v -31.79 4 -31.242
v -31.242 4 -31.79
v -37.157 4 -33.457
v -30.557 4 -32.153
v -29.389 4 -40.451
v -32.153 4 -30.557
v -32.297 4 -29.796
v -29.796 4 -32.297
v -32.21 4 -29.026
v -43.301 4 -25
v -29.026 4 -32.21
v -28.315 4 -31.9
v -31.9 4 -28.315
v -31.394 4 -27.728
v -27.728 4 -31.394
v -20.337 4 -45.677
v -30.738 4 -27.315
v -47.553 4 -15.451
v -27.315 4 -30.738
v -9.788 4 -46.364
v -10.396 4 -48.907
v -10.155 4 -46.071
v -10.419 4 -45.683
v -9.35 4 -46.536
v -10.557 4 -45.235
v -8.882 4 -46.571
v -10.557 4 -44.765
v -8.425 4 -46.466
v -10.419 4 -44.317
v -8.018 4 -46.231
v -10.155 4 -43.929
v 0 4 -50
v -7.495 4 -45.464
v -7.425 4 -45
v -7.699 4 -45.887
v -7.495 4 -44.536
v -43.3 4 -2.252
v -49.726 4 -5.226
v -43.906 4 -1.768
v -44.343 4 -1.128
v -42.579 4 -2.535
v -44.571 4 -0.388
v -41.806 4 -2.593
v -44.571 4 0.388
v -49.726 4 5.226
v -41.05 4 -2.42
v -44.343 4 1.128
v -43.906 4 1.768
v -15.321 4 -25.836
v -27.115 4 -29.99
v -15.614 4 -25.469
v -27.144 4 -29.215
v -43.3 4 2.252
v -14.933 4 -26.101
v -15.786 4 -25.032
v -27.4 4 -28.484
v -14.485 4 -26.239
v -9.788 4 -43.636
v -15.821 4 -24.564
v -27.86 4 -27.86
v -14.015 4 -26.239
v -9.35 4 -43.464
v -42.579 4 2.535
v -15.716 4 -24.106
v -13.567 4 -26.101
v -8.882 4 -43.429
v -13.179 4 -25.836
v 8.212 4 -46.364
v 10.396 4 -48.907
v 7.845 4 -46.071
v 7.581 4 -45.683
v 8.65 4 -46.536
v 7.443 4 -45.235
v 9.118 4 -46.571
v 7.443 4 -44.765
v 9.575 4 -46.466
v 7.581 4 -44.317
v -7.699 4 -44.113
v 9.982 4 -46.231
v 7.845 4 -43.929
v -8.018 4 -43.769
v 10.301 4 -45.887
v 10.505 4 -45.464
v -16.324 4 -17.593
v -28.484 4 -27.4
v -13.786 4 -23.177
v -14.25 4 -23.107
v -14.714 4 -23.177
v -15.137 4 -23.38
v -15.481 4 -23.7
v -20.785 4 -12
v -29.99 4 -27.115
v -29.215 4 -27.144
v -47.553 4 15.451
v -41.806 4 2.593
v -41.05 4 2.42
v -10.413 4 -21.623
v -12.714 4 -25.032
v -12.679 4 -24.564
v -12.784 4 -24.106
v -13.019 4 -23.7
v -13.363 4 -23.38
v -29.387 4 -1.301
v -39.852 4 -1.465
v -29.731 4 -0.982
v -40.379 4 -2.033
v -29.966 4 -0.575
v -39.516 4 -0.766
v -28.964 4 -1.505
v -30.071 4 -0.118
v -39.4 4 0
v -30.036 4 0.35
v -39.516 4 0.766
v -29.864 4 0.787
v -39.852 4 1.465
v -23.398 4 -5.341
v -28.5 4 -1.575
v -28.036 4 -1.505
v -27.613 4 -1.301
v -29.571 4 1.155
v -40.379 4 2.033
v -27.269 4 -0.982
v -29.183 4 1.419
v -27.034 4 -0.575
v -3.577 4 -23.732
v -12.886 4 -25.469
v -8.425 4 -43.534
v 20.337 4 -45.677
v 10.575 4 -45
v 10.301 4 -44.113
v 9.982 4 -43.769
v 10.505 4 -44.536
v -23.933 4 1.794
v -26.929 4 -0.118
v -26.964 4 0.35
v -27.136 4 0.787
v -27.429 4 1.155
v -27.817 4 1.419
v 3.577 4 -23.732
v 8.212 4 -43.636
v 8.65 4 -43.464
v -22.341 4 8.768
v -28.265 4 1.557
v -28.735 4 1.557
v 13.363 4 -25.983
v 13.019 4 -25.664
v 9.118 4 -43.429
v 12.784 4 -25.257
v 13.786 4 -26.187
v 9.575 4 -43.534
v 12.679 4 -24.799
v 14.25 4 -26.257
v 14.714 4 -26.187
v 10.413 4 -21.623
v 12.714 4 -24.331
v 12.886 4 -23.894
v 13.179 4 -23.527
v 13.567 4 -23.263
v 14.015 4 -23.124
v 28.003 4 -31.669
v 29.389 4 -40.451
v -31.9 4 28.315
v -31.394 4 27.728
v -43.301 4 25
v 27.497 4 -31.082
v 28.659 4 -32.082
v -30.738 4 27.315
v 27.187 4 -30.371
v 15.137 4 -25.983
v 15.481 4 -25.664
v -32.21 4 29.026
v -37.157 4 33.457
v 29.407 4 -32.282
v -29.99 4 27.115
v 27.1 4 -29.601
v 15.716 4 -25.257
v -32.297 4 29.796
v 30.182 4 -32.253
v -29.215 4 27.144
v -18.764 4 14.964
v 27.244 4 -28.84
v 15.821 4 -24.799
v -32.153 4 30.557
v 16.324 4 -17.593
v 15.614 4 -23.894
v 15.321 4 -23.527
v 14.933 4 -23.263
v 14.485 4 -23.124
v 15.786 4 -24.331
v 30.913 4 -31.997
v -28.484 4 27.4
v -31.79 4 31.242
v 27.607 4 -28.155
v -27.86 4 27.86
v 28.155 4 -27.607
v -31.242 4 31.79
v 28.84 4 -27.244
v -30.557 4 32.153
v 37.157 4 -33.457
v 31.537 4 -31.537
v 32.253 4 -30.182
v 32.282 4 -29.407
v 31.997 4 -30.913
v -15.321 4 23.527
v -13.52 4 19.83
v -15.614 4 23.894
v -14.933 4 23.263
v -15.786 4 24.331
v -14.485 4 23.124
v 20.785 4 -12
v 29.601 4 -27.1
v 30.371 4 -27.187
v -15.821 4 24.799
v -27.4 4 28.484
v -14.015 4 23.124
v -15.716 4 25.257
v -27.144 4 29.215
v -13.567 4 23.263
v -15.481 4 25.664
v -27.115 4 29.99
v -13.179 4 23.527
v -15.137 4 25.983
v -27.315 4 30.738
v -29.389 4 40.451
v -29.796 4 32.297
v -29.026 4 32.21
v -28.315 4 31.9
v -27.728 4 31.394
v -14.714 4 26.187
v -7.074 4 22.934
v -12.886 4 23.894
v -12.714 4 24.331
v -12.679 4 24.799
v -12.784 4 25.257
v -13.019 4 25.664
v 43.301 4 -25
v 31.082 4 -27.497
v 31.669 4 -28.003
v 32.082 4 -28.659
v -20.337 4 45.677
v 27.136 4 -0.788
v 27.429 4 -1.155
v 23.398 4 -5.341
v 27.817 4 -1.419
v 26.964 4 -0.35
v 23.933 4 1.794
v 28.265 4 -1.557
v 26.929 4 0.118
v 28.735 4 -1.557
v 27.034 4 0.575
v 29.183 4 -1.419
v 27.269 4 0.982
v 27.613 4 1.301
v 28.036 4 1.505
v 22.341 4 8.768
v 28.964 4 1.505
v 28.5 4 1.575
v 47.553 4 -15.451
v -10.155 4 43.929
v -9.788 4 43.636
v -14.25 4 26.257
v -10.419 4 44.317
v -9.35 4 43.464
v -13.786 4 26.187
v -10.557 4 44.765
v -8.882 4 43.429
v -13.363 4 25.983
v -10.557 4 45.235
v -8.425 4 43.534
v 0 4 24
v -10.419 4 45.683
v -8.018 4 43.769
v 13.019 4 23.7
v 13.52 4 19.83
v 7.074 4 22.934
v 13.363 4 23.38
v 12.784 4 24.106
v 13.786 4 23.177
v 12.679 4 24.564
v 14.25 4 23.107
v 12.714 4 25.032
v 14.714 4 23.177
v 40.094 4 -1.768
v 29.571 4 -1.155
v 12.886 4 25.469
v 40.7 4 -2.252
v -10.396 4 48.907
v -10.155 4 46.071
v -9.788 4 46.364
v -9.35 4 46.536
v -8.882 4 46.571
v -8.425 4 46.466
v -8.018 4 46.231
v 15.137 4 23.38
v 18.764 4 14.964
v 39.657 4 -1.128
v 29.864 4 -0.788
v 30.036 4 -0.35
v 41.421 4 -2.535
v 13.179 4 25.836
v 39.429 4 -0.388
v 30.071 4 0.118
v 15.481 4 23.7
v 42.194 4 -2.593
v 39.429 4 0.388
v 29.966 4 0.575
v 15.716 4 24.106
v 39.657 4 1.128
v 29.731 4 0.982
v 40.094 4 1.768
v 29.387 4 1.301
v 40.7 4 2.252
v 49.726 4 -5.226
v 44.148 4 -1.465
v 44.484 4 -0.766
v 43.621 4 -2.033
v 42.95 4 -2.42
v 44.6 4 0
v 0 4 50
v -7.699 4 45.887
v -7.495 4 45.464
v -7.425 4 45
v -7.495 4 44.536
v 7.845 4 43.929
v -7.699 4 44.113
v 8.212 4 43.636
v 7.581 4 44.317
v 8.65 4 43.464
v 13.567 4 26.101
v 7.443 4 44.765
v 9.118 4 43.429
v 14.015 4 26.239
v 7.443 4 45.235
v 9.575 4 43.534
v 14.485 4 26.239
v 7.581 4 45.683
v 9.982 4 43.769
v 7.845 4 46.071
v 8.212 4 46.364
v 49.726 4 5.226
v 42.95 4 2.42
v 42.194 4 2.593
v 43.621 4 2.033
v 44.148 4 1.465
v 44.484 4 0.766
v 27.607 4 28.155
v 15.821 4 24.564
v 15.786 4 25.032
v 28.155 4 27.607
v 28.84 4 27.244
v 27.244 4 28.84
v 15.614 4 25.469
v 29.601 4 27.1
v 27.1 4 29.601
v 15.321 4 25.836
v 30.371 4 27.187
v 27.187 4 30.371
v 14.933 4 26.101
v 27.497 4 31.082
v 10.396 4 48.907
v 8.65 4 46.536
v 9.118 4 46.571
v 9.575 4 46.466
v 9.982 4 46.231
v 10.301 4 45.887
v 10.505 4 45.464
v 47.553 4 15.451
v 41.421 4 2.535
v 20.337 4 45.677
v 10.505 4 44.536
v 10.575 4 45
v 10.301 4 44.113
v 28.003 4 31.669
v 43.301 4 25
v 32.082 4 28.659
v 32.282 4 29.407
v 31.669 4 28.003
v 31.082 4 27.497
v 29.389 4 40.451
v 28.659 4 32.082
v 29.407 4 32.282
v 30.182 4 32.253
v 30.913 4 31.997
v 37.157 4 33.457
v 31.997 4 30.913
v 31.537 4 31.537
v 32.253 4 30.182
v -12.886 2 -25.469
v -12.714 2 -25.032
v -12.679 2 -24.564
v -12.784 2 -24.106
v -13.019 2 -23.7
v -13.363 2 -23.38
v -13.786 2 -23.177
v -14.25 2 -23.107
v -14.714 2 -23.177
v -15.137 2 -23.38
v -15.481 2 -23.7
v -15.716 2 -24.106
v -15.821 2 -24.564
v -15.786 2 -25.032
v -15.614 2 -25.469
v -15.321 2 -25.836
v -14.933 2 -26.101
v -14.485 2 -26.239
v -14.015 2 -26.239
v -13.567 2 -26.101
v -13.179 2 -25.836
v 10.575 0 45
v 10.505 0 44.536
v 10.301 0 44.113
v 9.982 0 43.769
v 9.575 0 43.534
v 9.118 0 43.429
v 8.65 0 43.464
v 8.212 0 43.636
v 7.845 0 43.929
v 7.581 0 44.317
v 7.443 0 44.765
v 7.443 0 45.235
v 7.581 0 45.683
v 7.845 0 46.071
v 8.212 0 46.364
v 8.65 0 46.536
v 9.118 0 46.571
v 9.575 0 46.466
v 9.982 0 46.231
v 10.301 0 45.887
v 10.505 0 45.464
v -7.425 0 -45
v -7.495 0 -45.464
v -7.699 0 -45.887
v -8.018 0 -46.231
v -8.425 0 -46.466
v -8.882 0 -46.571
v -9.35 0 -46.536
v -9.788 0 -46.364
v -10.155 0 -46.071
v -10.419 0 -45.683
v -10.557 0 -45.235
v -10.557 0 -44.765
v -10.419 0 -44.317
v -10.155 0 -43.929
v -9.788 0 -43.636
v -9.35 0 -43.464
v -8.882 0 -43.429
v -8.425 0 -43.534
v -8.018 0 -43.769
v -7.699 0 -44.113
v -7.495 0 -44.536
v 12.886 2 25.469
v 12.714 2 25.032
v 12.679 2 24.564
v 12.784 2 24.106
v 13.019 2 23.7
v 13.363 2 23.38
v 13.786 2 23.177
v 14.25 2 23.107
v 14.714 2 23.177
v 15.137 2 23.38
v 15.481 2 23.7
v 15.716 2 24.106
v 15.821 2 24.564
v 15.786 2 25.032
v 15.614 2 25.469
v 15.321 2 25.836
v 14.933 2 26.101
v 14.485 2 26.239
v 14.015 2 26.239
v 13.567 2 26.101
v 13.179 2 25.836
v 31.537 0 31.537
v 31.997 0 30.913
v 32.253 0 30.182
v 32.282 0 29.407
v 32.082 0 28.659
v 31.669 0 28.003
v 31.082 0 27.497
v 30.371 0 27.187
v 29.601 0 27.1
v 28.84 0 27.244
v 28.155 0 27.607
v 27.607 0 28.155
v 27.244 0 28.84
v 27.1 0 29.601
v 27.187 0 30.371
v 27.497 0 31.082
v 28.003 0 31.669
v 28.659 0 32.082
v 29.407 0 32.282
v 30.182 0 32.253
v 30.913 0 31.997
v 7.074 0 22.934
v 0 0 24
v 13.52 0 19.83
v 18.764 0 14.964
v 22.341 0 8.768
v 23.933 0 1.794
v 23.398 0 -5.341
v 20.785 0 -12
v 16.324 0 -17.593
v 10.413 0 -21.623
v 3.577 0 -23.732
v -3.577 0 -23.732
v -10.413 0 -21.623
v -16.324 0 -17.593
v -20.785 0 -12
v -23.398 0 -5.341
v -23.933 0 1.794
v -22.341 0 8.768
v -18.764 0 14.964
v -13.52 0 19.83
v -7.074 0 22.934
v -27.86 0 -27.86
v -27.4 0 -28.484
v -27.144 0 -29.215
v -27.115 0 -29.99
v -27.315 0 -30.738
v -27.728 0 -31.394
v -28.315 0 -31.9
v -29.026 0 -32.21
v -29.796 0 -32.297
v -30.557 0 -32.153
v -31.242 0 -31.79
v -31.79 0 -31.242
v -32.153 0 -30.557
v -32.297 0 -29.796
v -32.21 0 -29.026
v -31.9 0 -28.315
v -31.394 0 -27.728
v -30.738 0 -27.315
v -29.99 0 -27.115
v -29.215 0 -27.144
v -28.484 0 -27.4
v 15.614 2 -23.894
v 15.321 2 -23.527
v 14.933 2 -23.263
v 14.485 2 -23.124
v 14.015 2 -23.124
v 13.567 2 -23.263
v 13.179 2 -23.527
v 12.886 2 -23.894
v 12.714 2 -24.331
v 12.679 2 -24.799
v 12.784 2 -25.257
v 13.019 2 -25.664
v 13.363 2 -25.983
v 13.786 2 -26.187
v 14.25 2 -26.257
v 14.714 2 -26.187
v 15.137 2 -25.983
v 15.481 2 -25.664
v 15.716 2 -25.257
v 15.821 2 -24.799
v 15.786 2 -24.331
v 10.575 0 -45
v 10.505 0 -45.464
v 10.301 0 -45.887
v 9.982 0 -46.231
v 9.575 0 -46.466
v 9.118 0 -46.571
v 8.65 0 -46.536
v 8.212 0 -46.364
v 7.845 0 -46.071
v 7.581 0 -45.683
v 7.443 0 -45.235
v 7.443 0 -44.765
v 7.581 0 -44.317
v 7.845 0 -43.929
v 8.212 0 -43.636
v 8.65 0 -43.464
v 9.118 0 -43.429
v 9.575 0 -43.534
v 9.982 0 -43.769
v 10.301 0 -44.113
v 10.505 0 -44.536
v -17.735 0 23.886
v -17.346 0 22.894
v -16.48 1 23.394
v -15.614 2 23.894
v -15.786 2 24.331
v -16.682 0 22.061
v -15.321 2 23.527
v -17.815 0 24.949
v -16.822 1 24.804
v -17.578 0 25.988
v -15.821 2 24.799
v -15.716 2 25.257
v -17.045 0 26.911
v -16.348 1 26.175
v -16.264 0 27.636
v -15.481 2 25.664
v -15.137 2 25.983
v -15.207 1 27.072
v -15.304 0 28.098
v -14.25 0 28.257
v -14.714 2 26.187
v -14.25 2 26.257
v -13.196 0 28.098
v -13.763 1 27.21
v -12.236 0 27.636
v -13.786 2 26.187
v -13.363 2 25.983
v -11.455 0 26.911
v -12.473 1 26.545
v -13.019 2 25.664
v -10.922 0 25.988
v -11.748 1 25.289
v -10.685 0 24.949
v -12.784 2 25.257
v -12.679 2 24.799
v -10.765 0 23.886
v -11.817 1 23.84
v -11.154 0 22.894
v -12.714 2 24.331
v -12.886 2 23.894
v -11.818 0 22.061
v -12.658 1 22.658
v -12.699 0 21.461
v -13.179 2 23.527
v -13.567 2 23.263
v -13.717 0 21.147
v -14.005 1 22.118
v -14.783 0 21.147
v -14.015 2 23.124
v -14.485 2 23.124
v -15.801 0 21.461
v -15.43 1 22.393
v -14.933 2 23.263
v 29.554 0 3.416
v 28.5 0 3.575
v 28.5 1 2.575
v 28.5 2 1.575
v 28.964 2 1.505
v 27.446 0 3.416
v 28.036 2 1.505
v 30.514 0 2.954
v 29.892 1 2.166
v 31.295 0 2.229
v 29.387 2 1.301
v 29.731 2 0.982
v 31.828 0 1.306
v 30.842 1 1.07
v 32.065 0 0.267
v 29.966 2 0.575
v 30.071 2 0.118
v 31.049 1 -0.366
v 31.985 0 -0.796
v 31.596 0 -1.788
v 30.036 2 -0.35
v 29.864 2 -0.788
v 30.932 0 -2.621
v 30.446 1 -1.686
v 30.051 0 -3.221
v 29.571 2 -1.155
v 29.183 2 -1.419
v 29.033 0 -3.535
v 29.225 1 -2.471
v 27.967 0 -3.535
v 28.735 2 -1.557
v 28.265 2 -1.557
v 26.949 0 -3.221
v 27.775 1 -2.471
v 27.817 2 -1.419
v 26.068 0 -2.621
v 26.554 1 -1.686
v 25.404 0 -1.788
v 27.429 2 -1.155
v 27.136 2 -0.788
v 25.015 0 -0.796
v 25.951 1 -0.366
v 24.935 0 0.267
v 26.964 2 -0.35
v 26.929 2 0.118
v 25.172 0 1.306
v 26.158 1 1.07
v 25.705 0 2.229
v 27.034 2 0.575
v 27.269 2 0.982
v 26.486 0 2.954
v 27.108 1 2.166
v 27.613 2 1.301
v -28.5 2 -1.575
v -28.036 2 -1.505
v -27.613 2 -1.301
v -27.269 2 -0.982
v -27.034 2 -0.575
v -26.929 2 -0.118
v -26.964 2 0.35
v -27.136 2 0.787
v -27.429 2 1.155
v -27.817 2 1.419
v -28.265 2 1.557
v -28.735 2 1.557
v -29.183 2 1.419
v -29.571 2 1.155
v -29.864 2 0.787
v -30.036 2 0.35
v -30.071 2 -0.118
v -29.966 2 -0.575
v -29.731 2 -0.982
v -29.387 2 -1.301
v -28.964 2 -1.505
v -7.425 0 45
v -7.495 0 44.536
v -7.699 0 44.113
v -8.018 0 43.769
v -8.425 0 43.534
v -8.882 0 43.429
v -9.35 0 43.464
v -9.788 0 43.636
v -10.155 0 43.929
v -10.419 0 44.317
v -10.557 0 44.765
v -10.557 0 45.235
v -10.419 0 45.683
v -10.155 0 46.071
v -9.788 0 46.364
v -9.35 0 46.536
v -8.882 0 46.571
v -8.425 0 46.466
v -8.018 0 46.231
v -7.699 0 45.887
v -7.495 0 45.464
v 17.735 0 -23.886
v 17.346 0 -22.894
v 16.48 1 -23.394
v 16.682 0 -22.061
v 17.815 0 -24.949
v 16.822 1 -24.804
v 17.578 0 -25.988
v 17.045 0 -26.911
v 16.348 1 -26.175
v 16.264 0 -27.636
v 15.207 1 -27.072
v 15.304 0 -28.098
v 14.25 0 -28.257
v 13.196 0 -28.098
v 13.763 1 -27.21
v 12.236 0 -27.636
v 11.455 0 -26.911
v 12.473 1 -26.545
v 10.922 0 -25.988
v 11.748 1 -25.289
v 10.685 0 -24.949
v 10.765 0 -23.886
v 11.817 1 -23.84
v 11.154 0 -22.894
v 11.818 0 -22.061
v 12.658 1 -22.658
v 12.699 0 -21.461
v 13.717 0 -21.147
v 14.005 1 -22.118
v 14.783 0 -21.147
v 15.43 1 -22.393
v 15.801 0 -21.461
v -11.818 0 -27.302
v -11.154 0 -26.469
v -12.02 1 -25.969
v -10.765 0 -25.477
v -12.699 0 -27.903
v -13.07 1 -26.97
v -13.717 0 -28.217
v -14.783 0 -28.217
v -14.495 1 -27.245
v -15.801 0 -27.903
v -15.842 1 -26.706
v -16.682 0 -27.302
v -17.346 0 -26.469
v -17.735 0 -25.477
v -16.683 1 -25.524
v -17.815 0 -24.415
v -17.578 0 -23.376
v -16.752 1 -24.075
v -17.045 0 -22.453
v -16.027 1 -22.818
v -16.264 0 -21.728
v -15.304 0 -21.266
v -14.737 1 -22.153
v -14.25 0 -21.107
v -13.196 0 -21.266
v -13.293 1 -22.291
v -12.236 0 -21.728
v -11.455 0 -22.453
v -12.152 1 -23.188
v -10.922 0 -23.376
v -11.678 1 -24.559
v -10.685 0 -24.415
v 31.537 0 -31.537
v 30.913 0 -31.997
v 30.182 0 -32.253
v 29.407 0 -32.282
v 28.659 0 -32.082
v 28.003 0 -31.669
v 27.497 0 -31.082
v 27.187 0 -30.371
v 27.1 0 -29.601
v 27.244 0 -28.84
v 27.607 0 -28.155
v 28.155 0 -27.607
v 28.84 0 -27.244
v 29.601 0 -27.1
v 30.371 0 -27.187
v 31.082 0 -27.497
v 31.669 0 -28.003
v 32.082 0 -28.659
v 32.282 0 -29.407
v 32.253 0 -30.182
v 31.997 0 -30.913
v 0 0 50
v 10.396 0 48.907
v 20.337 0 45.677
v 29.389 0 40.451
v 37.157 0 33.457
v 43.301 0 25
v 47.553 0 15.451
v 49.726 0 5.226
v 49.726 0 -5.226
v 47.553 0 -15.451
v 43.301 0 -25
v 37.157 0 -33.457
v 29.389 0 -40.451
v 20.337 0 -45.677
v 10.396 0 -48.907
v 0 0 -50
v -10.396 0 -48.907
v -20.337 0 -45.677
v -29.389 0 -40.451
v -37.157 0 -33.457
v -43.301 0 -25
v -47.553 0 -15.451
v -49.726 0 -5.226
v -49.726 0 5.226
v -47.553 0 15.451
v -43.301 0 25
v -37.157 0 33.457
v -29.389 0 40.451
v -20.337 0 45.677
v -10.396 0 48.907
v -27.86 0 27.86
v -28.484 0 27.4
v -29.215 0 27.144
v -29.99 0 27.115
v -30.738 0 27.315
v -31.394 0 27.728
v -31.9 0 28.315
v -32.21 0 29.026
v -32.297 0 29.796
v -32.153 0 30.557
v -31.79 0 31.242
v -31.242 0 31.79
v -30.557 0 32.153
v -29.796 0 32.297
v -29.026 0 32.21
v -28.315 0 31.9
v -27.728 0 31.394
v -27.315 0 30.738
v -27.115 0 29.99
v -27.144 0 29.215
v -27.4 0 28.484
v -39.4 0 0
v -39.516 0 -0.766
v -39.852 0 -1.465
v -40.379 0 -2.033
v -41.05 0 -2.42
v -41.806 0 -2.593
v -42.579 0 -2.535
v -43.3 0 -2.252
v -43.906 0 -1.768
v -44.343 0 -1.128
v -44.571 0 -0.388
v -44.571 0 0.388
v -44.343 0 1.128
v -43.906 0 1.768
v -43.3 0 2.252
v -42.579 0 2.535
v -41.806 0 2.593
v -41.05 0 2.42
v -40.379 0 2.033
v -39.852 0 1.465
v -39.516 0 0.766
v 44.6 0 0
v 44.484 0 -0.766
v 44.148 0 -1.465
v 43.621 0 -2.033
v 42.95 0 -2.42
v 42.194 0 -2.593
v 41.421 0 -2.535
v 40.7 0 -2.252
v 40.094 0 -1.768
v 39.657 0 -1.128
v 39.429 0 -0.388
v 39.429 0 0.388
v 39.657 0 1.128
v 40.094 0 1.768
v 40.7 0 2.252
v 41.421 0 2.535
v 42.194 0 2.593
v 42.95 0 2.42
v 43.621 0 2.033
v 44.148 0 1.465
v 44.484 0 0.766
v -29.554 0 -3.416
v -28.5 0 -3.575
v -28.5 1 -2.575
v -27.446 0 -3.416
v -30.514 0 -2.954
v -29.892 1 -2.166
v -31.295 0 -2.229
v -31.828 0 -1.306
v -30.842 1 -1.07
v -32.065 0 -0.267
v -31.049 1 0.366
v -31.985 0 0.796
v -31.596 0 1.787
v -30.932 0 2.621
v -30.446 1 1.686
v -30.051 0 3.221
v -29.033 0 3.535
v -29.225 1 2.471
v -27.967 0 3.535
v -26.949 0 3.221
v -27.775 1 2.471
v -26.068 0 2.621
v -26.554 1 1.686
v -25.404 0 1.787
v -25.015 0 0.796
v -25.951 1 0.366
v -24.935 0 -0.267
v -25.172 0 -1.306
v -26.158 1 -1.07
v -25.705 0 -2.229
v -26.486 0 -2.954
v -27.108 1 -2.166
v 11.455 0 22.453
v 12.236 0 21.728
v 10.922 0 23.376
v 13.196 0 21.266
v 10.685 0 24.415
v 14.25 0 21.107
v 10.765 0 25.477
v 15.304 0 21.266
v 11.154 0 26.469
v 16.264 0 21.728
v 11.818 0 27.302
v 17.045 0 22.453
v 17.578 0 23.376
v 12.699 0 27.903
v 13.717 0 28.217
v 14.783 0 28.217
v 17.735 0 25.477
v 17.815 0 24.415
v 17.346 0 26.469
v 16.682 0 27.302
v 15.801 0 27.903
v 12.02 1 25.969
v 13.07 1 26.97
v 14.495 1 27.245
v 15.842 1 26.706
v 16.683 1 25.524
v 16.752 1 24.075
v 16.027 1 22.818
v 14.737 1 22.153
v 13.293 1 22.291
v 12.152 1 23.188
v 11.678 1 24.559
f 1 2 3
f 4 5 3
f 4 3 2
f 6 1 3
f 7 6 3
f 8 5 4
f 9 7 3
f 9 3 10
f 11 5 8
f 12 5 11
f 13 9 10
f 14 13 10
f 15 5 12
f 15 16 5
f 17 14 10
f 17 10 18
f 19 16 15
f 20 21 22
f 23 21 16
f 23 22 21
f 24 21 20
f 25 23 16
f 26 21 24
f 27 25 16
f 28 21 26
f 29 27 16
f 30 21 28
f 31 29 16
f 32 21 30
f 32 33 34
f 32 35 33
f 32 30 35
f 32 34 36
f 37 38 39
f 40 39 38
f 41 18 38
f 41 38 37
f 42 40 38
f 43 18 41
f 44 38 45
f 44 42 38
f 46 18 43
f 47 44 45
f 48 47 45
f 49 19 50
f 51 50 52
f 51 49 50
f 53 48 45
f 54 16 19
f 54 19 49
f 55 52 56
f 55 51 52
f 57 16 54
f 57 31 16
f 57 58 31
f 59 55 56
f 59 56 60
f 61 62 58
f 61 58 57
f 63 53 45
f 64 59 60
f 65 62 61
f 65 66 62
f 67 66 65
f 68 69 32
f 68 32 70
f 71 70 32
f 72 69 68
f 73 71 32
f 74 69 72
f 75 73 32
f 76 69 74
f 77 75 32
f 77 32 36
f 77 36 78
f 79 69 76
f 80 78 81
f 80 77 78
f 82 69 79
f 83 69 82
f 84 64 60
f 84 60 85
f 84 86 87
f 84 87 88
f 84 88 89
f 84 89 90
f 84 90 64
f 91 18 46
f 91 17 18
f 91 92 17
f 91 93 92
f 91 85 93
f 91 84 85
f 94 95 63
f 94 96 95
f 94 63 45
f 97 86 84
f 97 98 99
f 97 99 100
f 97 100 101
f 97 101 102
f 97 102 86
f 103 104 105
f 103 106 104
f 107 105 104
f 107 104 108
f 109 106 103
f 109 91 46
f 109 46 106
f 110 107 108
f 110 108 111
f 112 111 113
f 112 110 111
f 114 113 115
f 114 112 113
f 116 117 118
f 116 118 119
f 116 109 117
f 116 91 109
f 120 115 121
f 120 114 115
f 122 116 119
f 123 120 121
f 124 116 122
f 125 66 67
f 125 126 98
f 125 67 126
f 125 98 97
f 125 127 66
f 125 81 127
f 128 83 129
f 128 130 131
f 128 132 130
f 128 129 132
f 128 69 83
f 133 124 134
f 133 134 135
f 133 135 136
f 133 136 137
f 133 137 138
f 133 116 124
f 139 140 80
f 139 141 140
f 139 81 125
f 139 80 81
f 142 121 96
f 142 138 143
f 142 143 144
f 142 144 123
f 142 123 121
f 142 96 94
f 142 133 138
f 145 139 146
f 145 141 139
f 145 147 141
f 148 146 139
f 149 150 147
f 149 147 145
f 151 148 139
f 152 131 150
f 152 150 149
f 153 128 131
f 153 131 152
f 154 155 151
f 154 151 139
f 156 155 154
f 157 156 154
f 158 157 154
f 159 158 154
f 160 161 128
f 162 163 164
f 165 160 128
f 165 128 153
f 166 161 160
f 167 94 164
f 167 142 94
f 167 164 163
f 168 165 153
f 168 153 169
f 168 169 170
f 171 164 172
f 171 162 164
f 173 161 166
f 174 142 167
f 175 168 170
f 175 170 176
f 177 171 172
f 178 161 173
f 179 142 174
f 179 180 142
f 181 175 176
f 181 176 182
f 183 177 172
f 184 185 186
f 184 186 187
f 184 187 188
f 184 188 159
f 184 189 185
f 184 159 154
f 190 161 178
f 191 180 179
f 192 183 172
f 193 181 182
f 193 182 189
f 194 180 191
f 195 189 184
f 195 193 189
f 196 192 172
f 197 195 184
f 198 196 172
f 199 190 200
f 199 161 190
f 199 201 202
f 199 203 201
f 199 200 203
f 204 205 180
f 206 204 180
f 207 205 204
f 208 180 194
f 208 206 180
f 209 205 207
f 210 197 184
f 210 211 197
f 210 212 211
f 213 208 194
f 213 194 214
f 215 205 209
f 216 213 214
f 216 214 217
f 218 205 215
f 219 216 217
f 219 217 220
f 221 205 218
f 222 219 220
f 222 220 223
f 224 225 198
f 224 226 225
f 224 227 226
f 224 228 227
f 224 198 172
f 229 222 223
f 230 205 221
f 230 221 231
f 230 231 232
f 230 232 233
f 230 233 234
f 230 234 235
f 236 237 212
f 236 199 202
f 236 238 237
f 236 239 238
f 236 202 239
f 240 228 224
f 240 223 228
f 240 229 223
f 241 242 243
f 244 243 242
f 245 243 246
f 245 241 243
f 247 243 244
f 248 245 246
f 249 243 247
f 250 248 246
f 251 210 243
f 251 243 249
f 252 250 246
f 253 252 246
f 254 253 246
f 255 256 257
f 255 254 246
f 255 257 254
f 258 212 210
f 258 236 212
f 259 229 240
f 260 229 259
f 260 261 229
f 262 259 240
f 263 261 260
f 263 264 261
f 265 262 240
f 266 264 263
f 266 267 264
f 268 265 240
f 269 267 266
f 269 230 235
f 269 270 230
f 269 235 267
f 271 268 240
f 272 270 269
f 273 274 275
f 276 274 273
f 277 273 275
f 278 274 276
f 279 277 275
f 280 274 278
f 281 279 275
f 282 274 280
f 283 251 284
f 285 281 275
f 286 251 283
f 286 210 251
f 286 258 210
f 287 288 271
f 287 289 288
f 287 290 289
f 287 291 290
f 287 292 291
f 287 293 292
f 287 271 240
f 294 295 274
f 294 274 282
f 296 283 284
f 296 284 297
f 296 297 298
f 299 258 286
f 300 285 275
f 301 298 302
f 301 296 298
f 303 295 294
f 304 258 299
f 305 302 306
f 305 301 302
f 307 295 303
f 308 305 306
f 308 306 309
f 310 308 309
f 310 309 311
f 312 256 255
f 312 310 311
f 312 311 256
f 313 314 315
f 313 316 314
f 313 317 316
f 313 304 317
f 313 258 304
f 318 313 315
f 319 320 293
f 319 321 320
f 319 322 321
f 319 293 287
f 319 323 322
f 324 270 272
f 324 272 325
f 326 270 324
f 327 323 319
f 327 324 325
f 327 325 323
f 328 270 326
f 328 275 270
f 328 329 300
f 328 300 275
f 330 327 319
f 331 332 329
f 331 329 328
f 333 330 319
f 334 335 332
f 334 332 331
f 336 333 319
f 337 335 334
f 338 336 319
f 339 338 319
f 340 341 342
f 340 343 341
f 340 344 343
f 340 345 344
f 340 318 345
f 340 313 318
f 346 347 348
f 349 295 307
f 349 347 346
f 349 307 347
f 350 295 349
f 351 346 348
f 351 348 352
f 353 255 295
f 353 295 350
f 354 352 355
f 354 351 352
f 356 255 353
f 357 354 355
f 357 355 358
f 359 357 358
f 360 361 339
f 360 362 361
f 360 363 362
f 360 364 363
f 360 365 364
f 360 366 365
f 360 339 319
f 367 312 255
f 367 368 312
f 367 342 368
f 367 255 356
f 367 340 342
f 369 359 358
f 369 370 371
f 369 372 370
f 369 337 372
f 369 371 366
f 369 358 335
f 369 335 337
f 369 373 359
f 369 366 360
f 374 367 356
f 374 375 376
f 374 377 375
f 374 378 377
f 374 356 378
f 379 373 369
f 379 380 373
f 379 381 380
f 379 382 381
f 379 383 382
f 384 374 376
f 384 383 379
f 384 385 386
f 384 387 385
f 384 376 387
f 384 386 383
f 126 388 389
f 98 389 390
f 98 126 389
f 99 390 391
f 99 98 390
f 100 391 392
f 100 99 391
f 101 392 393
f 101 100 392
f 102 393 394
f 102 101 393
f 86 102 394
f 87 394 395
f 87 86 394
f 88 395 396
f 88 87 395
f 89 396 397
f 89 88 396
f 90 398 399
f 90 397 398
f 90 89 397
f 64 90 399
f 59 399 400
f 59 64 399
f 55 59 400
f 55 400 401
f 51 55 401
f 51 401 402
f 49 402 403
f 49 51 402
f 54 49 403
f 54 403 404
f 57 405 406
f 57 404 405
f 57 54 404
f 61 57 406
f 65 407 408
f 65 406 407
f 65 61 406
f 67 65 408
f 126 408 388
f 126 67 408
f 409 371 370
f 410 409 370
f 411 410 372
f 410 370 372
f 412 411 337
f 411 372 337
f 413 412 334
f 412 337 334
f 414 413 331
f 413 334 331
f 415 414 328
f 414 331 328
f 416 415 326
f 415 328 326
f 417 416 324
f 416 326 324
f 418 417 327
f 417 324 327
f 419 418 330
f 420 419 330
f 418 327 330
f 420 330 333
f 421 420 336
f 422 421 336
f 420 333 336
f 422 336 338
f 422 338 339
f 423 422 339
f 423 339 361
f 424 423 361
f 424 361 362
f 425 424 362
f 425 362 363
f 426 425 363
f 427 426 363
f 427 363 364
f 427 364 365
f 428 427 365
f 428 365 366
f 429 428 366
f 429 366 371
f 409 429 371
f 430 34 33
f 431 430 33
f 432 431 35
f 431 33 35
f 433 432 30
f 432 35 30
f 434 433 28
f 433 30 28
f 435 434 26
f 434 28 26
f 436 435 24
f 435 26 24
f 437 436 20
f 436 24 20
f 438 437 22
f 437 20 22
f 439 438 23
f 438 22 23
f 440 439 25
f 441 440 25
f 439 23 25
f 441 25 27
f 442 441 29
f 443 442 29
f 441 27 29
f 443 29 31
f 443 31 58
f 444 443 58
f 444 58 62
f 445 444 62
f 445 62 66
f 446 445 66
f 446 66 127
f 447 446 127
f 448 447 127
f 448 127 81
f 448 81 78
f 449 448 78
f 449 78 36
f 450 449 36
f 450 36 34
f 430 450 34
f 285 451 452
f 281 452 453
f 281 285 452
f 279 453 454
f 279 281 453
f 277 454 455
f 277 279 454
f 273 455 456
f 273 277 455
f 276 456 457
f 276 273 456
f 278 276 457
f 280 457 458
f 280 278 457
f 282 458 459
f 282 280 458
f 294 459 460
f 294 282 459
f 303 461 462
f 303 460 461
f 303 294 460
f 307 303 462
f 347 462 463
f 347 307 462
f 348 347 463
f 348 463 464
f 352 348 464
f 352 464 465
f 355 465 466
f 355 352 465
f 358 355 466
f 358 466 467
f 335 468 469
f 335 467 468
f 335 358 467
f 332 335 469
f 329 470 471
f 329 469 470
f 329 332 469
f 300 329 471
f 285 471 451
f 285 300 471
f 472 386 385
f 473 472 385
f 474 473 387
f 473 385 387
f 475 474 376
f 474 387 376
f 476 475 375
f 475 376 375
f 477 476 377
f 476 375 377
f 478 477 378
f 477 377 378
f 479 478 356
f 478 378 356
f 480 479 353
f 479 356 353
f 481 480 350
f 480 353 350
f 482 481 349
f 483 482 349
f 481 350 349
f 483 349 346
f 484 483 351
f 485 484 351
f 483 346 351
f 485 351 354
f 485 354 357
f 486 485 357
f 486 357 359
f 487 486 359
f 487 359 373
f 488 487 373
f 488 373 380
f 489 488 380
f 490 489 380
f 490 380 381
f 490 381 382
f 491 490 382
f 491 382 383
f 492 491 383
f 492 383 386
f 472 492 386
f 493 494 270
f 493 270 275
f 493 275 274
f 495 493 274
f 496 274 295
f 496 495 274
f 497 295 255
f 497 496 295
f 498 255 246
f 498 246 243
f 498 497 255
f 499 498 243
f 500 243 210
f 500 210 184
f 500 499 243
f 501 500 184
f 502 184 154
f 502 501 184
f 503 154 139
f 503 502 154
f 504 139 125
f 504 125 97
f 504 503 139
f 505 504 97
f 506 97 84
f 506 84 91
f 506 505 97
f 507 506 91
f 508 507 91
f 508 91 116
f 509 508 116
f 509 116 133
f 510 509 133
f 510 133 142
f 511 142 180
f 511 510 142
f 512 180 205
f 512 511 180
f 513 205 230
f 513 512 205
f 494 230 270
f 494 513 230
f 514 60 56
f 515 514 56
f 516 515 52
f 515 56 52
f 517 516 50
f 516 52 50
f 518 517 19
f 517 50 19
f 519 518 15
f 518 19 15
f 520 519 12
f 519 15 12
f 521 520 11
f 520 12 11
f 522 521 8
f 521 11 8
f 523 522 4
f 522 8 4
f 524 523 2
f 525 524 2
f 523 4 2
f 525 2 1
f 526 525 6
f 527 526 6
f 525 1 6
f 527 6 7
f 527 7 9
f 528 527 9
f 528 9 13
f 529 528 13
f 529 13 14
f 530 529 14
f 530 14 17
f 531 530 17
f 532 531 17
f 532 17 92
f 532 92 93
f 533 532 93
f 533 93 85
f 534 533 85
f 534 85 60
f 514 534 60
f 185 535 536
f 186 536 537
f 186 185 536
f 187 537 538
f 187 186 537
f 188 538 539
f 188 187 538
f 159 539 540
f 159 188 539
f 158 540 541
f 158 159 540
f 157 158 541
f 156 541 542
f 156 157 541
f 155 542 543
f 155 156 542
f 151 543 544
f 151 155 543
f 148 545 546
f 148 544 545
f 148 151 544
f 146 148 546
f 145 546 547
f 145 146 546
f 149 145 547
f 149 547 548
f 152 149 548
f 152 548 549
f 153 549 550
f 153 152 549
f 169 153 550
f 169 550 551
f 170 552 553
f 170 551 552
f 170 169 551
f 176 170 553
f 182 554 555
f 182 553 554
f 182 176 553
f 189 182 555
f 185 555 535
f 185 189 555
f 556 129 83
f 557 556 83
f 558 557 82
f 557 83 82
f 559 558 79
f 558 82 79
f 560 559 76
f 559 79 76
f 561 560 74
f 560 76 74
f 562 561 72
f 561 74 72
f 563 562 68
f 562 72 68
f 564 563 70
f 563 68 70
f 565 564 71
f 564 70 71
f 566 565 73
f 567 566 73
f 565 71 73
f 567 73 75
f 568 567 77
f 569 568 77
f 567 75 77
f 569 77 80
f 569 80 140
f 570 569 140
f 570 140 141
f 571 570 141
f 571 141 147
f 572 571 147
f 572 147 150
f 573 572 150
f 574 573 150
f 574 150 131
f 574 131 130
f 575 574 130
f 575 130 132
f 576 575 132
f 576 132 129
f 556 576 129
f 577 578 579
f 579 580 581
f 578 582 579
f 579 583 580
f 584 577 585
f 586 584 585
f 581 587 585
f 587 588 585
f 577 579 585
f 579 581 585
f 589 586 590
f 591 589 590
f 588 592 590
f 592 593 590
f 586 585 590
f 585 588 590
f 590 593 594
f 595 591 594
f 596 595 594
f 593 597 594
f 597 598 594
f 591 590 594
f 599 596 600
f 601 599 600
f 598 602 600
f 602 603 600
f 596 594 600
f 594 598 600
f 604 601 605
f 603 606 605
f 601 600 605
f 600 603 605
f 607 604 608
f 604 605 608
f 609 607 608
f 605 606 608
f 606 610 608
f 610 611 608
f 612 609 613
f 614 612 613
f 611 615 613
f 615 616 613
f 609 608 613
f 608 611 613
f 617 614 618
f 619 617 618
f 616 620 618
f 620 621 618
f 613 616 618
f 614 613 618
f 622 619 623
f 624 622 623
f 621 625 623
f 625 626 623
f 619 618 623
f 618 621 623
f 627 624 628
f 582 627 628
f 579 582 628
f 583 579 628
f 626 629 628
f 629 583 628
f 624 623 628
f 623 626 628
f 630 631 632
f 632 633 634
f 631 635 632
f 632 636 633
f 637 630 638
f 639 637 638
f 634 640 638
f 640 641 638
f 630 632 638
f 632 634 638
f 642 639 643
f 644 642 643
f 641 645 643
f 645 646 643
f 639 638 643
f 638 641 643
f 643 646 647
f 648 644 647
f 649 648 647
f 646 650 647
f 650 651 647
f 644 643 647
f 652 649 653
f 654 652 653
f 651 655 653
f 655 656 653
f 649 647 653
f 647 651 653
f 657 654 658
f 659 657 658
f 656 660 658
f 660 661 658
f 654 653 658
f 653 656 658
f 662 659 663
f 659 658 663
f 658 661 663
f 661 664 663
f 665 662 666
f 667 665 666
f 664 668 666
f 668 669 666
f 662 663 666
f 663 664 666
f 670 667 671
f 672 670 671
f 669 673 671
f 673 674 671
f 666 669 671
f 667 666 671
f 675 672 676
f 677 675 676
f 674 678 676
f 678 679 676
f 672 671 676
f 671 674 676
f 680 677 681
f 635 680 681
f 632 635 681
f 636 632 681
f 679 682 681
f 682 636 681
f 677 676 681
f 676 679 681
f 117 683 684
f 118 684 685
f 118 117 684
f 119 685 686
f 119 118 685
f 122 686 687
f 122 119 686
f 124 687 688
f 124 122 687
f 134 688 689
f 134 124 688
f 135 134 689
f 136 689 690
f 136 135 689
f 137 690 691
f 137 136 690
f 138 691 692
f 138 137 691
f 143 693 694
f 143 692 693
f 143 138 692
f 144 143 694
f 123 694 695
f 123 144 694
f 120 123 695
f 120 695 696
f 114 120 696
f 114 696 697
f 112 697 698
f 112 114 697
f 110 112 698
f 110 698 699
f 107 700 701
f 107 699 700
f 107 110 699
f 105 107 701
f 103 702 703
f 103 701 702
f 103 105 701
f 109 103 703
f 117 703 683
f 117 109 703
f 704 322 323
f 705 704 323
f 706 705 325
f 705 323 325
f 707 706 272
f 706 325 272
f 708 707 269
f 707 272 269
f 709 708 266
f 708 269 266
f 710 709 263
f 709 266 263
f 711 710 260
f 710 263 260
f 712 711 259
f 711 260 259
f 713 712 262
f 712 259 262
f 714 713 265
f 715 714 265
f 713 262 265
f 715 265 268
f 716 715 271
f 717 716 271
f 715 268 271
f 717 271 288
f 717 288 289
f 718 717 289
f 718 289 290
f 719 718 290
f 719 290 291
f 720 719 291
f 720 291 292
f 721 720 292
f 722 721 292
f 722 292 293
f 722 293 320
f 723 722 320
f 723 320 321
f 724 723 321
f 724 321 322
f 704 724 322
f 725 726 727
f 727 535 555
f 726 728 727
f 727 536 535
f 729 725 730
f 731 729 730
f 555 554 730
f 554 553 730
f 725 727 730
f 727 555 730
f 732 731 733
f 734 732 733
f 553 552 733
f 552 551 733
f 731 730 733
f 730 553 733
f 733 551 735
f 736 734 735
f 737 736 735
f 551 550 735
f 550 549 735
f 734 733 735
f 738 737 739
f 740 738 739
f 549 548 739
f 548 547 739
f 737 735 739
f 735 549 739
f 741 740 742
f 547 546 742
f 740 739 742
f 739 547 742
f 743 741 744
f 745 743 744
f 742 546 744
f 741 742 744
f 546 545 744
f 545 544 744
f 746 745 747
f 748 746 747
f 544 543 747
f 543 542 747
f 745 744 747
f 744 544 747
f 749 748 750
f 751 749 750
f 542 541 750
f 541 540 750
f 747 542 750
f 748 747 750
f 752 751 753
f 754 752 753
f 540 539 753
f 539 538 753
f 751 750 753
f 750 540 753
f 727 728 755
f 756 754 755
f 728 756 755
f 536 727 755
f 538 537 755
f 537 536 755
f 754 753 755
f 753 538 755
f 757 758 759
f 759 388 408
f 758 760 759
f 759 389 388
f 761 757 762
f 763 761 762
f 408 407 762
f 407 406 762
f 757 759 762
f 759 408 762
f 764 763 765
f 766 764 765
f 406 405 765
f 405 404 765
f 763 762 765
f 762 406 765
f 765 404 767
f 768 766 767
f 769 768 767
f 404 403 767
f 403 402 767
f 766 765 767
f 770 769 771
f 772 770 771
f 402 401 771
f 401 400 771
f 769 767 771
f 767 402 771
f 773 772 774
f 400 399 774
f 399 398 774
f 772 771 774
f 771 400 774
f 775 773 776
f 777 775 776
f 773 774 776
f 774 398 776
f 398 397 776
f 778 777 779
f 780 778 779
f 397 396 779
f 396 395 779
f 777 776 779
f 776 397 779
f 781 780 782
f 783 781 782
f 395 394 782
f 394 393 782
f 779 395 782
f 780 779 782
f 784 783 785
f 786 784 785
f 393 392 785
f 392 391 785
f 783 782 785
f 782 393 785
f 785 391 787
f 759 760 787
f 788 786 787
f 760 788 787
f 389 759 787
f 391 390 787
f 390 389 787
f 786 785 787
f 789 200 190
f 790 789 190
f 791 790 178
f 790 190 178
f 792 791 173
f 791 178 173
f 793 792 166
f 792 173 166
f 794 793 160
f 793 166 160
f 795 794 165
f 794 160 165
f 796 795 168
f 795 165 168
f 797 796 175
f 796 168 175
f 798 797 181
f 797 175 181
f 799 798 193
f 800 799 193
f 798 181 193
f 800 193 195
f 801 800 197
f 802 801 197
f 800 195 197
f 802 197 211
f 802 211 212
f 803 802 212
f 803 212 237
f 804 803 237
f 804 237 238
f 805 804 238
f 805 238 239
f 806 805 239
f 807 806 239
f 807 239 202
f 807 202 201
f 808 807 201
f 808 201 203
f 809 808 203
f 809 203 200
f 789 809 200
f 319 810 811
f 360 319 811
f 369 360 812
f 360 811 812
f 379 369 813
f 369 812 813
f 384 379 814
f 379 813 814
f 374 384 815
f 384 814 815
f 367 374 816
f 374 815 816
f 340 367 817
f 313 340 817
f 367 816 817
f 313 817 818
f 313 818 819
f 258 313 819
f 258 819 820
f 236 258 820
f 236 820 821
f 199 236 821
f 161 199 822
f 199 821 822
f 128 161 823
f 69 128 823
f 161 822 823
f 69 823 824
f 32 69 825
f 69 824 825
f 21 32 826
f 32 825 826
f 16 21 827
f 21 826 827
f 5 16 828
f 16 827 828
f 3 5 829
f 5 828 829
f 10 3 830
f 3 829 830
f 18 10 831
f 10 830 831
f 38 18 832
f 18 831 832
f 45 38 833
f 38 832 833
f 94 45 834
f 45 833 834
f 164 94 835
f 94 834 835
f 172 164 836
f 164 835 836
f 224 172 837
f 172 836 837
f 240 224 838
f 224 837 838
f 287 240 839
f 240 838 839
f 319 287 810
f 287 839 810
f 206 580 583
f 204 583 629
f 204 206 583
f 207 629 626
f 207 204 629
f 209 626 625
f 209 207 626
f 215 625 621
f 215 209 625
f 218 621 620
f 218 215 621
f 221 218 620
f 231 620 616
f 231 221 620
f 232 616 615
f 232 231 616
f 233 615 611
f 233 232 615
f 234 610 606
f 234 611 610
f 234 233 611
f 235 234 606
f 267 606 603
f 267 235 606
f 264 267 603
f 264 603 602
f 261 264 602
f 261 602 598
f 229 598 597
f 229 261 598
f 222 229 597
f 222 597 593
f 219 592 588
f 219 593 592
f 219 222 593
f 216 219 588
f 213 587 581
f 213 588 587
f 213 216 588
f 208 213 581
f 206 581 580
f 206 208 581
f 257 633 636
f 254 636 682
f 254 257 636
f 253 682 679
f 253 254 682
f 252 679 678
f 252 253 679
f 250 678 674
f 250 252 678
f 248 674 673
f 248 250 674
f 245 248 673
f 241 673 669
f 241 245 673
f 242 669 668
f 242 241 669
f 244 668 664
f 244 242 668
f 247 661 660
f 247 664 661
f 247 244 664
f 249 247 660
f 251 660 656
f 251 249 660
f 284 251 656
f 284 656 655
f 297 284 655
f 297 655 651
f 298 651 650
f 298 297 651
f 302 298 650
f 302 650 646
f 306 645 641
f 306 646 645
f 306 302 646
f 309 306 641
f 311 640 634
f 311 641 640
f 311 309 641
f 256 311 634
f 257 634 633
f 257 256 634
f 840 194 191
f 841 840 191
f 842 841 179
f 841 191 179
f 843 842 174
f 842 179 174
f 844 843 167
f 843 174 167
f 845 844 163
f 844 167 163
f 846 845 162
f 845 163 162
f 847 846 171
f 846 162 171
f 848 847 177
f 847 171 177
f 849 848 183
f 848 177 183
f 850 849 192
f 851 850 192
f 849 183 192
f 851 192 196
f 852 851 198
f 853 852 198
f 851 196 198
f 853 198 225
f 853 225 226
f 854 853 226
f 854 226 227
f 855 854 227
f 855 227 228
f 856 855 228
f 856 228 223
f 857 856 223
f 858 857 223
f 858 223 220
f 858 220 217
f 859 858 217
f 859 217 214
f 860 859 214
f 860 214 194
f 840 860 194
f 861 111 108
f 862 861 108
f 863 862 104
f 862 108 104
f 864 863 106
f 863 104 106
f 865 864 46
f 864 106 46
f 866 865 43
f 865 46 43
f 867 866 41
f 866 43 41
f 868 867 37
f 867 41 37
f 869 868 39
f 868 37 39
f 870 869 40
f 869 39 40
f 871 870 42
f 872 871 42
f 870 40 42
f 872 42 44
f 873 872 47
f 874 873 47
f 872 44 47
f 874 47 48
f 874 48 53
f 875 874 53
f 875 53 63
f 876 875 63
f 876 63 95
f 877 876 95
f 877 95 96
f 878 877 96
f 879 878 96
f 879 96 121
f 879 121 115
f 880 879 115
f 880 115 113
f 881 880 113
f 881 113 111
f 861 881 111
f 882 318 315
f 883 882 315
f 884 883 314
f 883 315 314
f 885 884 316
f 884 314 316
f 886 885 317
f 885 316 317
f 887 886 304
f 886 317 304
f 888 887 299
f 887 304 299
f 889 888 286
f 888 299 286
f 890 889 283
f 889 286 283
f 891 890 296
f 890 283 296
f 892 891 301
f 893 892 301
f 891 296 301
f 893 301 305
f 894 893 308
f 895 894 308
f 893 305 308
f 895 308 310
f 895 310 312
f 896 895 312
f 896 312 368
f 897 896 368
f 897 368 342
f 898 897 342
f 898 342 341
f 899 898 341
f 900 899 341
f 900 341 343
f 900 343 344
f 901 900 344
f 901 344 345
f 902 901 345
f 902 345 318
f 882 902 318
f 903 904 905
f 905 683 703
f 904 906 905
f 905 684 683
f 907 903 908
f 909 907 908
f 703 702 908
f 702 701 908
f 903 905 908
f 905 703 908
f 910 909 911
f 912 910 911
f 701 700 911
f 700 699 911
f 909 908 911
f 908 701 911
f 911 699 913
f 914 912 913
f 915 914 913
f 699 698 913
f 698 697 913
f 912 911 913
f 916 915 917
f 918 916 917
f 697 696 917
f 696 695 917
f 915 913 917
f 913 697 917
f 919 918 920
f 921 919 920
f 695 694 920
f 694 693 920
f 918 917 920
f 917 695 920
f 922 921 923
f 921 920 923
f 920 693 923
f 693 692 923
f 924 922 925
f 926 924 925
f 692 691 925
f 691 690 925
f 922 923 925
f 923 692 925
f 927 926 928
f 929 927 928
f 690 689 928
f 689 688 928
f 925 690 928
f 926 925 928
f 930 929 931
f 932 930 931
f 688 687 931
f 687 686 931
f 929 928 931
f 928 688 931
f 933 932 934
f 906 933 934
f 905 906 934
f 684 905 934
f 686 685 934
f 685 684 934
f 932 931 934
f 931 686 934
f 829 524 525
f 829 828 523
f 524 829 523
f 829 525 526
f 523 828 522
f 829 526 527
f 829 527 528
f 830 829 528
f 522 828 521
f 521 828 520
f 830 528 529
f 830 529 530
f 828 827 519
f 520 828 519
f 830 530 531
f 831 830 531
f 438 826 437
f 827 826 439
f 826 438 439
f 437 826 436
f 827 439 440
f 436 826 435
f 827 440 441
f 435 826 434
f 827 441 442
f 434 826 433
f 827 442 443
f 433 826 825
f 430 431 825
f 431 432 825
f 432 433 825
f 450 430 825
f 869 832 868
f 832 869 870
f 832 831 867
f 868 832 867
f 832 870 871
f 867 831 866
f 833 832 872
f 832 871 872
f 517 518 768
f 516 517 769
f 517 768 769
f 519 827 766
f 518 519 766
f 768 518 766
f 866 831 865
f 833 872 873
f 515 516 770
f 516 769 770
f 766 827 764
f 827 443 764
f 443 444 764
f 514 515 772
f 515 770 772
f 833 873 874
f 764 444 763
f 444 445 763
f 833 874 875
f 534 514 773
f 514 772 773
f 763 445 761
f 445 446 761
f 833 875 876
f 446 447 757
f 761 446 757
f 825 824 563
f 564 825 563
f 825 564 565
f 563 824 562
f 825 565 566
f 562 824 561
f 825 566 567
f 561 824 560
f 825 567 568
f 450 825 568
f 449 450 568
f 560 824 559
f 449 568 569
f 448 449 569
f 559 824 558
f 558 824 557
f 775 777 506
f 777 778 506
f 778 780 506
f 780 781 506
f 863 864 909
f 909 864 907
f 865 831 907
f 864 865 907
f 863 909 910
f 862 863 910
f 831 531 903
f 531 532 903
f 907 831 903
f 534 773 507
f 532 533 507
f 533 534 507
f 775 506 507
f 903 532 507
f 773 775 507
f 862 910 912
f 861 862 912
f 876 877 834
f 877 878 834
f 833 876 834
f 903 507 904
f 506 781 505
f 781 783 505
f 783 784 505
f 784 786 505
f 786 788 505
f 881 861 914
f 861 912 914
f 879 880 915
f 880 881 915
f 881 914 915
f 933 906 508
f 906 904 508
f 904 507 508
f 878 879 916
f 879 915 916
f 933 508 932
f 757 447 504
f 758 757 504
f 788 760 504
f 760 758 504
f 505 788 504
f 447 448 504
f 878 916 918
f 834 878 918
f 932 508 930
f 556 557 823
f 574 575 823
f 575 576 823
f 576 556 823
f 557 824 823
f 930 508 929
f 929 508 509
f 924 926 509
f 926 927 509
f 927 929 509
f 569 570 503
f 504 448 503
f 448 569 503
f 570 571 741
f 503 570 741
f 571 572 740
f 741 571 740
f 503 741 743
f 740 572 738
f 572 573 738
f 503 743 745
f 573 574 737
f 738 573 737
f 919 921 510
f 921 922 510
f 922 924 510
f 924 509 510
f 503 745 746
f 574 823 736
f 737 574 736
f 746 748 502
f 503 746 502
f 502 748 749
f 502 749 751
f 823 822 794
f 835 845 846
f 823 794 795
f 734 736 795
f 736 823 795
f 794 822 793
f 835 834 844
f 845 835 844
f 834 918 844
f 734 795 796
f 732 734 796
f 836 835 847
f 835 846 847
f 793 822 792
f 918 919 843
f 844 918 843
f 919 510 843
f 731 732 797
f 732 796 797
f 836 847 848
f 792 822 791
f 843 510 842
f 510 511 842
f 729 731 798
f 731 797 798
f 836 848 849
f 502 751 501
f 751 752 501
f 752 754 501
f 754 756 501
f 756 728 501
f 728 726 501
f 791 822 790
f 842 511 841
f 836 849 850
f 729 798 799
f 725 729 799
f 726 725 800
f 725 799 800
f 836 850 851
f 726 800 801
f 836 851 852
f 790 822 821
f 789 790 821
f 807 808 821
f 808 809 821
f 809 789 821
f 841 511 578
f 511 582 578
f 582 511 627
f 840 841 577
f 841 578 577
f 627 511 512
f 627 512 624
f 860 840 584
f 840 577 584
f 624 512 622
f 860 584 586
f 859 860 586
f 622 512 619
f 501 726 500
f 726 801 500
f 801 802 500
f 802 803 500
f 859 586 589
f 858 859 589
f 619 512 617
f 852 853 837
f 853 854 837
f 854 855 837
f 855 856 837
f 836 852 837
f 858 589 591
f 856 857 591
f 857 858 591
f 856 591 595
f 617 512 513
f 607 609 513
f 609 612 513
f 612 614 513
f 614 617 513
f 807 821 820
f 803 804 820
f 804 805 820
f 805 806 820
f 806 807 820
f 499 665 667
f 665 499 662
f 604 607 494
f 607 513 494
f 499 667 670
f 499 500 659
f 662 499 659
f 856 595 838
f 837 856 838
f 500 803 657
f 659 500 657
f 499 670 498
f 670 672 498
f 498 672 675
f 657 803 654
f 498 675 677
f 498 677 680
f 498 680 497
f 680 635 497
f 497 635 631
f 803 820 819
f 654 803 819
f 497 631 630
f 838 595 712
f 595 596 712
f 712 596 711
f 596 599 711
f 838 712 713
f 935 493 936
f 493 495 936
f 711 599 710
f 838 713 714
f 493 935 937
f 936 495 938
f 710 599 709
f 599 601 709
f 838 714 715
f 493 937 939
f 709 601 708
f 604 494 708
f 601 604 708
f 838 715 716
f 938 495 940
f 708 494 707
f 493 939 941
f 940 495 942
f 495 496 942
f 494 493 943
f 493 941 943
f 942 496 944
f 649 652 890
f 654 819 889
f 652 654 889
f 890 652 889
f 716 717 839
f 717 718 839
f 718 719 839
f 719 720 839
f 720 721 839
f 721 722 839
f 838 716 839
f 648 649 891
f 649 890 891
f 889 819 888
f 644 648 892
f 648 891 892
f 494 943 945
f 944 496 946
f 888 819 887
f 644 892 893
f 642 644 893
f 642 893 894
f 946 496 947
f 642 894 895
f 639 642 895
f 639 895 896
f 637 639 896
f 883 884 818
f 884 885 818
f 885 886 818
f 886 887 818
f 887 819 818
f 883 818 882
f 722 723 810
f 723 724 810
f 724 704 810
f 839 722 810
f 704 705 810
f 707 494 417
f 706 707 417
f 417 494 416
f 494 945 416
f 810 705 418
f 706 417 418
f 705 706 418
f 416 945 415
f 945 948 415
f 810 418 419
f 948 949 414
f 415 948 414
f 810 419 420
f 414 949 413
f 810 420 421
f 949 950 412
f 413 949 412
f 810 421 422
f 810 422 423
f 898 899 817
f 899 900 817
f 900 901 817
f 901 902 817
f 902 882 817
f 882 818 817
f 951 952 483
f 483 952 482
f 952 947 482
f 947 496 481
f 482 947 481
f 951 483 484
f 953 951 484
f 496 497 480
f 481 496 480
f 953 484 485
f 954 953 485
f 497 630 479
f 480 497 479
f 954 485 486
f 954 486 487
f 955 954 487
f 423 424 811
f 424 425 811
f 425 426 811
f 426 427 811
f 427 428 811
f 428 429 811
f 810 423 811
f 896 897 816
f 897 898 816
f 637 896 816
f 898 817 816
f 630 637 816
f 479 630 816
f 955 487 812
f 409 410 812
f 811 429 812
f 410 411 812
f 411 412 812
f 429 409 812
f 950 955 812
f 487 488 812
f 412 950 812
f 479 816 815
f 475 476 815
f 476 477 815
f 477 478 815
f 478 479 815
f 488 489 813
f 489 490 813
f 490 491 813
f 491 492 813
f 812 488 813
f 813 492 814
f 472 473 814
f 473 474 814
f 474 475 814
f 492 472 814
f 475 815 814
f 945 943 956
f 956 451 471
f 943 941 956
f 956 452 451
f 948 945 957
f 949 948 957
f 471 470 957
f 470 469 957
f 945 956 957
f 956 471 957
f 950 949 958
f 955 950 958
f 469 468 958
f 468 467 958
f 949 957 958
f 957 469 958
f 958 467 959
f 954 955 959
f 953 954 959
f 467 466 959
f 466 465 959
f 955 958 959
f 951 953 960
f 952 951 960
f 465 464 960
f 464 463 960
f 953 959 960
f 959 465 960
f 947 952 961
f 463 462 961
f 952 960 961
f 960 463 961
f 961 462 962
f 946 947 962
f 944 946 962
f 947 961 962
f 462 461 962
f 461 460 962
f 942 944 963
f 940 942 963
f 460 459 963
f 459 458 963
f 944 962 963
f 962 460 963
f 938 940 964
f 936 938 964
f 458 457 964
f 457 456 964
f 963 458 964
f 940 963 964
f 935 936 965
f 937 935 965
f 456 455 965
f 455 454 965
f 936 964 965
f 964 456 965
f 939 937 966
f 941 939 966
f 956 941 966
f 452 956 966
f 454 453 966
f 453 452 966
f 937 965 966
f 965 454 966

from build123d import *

# Parameters (mm, degrees)
SKETCH_1_R                  = 50
SKETCH_1_R_2                = 24
EXTRUDE_1_DEPTH             = 4
PATTERN_CIRCULAR_1_COUNT    = 6
CHAMFER_1_SIZE              = 2
HOLE_WIZARD_M32_D           = 3.15
PATTERN_LINEAR_1_COUNT      = 2
PATTERN_LINEAR_1_PITCH      = 18
PATTERN_LINEAR_1_COUNT_DIR2 = 2
PATTERN_LINEAR_1_PITCH_DIR2 = 90
HOLE_WIZARD_M52_D           = 5.2
PATTERN_CIRCULAR_3_COUNT    = 2
PATTERN_CIRCULAR_3_ANGLE    = 45
F_3_THE_OTHER_WAY_COUNT     = 2
F_3_THE_OTHER_WAY_ANGLE     = 45


with BuildPart() as part:
    # Эскиз1 → Бобышка-Вытянуть1 (new body)
    with BuildSketch(Plane(origin=(0, 0, 0), x_dir=(1, 0, 0), z_dir=(0, 1, 0))):
        with Locations(Location((0, 0, 0), (0, 0, 270))):
            Circle(SKETCH_1_R)
        with Locations(Location((0, 0, 0), (0, 0, 270))):
            Circle(SKETCH_1_R_2, mode=Mode.SUBTRACT)
    extrude(amount=EXTRUDE_1_DEPTH)

    # Эскиз3 → Сверло под метчик  спиральное M31 (revolve, cut)
    with BuildSketch(Plane(origin=(28.5, 4, 0), x_dir=(0, 0, 1), z_dir=(1, 0, 0))):
        Polygon((0, 0), (0, 8.946355475), (1.575, 8), (1.575, 0), align=None)
    hole_wizard_m31 = revolve(axis=Axis((28.5, 10.35, 0), (0, -1, 0)), mode=Mode.SUBTRACT)

    # Круговой массив1: Сверло под метчик  спиральное M31 ×6 about axis
    pattern_circular_1_axis = Axis((0, 0, 0), (0, 1, 0))
    for i in range(1, PATTERN_CIRCULAR_1_COUNT):
        add(hole_wizard_m31.rotate(pattern_circular_1_axis, i * 360 / PATTERN_CIRCULAR_1_COUNT), mode=Mode.SUBTRACT)

    # Фаска1
    chamfer_1_edges = [part.edges().sort_by_distance(p)[0] for p in [
        (28.5, 0, -1.575),
        (12.886009989, 0, -25.469224008),
        (-15.613990011, 0, -23.894224008),
        (-28.5, 0, 1.575),
        (-12.886009989, 0, 25.469224008),
        (15.613990011, 0, 23.894224008),
    ]]
    chamfer(chamfer_1_edges, length=CHAMFER_1_SIZE)

    # Сверло под метчик  спиральное M32 (through all)
    with Locations(Plane(origin=(0, 0, 0), x_dir=(-1, 0, 0), z_dir=(0, -1, 0))):
        with Locations((-9, -45)):
            hole_wizard_m32 = Hole(HOLE_WIZARD_M32_D / 2)

    # Линейный массив1: Hole Wizard M32 2 × 2
    with Locations(*[(-i * PATTERN_LINEAR_1_PITCH, 0, -j * PATTERN_LINEAR_1_PITCH_DIR2) for i in range(PATTERN_LINEAR_1_COUNT) for j in range(PATTERN_LINEAR_1_COUNT_DIR2) if (i, j) != (0, 0)]):
        add(hole_wizard_m32, mode=Mode.SUBTRACT)

    # Сверло под метчик  спиральное M52 (through all)
    with Locations(Plane(origin=(0, 0, 0), x_dir=(-1, 0, 0), z_dir=(0, -1, 0))):
        with Locations((42, 0), (-42, 0)):
            hole_wizard_m52 = Hole(HOLE_WIZARD_M52_D / 2)

    # Круговой массив3: Сверло под метчик  спиральное M52 ×2 about axis
    pattern_circular_3_axis = Axis((0, 0, 0), (0, 1, 0))
    for i in range(1, PATTERN_CIRCULAR_3_COUNT):
        add(hole_wizard_m52.rotate(pattern_circular_3_axis, i * PATTERN_CIRCULAR_3_ANGLE / (PATTERN_CIRCULAR_3_COUNT - 1)), mode=Mode.SUBTRACT)

    # 3 the other way: Сверло под метчик  спиральное M52 ×2 about axis
    f_3_the_other_way_axis = Axis((0, 0, 0), (0, -1, 0))
    for i in range(1, F_3_THE_OTHER_WAY_COUNT):
        add(hole_wizard_m52.rotate(f_3_the_other_way_axis, i * F_3_THE_OTHER_WAY_ANGLE / (F_3_THE_OTHER_WAY_COUNT - 1)), mode=Mode.SUBTRACT)


solid = part.part
